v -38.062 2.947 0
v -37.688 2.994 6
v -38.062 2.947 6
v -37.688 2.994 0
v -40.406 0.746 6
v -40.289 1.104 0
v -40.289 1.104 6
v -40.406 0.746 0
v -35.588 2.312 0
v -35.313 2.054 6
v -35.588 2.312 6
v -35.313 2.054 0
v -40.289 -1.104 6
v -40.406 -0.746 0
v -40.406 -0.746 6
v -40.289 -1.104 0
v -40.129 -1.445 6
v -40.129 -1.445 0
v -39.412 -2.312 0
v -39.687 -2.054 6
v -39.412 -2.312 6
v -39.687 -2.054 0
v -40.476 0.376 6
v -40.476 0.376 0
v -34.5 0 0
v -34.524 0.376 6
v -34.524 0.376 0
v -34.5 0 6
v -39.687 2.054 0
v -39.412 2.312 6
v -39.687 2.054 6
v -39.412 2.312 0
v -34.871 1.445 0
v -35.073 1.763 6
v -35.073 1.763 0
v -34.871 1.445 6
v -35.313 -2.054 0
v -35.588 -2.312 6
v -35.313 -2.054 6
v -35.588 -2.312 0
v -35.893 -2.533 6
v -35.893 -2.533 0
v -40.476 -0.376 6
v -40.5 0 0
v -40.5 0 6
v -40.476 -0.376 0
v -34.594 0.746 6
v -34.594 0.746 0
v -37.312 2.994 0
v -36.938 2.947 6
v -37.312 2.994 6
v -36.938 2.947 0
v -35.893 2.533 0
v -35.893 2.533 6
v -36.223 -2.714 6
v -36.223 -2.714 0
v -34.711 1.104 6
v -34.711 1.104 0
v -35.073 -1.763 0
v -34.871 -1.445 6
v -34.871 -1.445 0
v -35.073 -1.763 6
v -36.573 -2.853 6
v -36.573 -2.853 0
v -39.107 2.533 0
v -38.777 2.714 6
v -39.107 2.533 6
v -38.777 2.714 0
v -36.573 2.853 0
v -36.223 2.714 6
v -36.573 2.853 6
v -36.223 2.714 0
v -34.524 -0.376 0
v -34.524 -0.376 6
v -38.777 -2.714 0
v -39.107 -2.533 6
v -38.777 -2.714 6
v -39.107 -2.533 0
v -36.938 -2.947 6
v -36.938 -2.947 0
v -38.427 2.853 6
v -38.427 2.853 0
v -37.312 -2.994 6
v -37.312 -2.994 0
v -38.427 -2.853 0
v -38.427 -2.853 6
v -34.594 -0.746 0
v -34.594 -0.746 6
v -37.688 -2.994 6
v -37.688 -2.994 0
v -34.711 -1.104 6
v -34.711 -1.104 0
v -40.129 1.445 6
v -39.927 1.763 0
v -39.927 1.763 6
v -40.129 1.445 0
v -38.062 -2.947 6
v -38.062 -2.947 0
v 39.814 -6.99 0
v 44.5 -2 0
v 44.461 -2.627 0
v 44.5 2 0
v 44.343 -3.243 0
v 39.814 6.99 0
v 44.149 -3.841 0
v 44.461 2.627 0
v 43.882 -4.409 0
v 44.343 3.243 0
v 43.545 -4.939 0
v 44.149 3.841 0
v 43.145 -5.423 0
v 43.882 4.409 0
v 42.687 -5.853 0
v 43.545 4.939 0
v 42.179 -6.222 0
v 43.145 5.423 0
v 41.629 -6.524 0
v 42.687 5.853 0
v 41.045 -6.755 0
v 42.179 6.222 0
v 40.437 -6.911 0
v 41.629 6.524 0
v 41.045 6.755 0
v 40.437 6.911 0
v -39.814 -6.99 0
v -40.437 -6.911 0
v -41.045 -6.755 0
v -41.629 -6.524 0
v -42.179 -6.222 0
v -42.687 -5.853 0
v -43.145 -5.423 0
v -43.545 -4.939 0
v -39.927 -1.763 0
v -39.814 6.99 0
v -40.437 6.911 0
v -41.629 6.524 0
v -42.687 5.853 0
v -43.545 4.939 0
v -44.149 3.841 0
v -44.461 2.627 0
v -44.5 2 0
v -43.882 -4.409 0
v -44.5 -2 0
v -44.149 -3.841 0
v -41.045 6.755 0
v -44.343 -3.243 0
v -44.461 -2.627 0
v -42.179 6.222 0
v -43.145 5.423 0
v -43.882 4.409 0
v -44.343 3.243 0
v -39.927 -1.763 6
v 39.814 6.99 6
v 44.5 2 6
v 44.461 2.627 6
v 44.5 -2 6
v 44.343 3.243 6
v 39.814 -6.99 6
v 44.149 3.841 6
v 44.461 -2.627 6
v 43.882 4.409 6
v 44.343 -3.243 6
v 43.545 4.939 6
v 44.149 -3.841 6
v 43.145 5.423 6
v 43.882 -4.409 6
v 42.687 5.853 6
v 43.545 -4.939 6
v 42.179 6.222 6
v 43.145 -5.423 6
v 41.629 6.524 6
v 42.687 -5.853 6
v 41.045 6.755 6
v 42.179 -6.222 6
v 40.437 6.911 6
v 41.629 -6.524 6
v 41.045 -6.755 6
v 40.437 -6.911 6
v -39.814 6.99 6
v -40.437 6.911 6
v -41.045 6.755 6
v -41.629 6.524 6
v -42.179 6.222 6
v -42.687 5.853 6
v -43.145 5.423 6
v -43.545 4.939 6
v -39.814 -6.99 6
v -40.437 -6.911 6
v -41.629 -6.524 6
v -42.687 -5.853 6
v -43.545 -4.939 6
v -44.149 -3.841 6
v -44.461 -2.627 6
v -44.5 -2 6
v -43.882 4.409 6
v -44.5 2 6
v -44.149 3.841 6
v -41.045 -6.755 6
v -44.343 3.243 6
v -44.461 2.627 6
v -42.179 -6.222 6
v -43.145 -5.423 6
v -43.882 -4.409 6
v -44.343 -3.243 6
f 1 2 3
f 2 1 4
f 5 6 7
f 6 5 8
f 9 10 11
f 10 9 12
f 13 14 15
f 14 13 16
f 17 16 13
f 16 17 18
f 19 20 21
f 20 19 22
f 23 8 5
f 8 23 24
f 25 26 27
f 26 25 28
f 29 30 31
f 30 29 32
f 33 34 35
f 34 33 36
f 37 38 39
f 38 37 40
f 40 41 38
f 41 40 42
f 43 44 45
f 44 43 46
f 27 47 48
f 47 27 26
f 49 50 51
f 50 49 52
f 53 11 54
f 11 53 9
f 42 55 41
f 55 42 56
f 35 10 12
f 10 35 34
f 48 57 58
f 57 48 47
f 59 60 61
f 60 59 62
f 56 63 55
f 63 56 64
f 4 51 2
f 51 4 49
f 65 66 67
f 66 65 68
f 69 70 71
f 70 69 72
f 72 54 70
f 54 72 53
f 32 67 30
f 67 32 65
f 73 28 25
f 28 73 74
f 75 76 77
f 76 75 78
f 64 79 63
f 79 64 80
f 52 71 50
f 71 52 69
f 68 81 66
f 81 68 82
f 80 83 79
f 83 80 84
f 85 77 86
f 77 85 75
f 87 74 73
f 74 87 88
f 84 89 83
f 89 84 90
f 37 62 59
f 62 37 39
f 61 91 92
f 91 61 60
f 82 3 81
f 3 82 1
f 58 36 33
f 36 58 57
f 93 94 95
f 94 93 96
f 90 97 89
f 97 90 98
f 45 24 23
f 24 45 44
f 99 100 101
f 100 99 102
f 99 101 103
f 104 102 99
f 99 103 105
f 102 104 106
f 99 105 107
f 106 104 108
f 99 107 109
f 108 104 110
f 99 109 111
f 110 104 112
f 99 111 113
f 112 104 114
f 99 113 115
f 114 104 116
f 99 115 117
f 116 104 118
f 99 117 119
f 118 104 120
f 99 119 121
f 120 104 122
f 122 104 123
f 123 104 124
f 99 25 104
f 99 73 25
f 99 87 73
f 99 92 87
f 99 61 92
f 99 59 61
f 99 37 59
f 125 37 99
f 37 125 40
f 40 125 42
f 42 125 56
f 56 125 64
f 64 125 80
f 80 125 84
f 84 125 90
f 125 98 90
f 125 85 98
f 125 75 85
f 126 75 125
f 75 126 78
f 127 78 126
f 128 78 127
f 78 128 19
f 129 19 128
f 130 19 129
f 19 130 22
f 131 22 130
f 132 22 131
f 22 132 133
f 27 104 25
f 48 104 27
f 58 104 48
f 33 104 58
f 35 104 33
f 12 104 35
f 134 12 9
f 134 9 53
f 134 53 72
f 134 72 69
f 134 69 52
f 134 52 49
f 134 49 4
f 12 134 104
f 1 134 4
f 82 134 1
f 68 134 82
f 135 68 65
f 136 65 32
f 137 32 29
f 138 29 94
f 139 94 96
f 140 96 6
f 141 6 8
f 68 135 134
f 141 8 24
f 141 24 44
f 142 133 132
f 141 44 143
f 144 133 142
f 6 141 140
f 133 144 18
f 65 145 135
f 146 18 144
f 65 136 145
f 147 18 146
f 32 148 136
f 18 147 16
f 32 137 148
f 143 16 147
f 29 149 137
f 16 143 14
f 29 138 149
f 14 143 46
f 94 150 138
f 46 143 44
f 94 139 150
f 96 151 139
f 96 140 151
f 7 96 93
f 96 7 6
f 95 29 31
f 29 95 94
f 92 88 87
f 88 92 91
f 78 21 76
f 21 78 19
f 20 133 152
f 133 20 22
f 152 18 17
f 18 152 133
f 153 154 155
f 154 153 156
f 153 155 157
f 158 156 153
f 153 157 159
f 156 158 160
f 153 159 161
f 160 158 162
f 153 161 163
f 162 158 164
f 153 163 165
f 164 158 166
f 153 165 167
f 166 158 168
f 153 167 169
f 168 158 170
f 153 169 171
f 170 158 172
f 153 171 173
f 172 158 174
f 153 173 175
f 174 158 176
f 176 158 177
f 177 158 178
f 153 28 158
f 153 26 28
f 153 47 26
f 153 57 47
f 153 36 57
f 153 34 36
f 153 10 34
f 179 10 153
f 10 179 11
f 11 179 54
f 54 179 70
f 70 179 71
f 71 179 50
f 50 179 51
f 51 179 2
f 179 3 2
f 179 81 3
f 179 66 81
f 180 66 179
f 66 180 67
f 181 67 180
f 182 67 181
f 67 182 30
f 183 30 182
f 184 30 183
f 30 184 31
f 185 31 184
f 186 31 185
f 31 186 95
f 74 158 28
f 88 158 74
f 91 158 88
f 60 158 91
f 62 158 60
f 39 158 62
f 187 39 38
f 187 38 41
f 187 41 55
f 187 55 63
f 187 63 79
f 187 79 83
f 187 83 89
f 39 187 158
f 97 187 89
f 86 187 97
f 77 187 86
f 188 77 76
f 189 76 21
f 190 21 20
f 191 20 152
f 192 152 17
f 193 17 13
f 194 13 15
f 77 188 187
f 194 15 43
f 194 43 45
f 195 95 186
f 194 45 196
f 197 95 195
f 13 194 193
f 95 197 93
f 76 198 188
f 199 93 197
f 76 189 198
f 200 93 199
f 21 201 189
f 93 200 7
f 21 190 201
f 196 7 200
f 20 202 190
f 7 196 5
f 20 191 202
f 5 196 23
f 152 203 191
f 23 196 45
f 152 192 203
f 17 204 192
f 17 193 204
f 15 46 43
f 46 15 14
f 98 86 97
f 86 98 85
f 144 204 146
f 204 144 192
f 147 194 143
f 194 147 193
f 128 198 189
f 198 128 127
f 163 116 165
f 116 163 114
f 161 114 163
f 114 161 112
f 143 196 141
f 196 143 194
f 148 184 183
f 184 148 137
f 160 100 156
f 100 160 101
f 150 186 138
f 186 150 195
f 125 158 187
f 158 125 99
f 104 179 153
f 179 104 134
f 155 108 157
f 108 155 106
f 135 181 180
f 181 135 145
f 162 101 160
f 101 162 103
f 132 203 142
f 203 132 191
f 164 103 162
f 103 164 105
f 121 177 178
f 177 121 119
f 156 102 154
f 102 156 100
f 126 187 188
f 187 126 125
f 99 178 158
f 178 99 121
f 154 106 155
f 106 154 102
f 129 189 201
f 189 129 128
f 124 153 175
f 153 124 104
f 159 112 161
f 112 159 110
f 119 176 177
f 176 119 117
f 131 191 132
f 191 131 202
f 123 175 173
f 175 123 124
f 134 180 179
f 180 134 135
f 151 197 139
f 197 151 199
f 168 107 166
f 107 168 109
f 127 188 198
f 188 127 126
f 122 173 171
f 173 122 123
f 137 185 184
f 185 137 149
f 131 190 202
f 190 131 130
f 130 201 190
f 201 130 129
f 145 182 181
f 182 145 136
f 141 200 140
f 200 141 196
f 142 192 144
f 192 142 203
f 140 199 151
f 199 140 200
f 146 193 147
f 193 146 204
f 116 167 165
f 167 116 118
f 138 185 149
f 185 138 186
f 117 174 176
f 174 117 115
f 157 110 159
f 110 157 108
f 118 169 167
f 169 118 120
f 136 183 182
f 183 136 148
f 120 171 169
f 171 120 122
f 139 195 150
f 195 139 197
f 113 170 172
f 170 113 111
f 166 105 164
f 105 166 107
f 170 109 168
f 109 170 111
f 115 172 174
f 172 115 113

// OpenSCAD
$fn = 50;


difference() {
	union() {
		hull() {
			translate(v = [-39.5000000000, 2.0000000000, 0]) {
				cylinder(h = 6, r = 5);
			}
			translate(v = [39.5000000000, 2.0000000000, 0]) {
				cylinder(h = 6, r = 5);
			}
			translate(v = [-39.5000000000, -2.0000000000, 0]) {
				cylinder(h = 6, r = 5);
			}
			translate(v = [39.5000000000, -2.0000000000, 0]) {
				cylinder(h = 6, r = 5);
			}
		}
	}
	union() {
		translate(v = [-37.5000000000, 0.0000000000, 0]) {
			cylinder(h = 6, r = 3.0000000000);
		}
		translate(v = [-37.5000000000, 0.0000000000, 0]) {
			cylinder(h = 6, r = 1.5000000000);
		}
		translate(v = [-37.5000000000, 0.0000000000, 0]) {
			cylinder(h = 6, r = 1.5000000000);
		}
		translate(v = [-37.5000000000, 0.0000000000, 0]) {
			cylinder(h = 6, r = 1.5000000000);
		}
	}
}
